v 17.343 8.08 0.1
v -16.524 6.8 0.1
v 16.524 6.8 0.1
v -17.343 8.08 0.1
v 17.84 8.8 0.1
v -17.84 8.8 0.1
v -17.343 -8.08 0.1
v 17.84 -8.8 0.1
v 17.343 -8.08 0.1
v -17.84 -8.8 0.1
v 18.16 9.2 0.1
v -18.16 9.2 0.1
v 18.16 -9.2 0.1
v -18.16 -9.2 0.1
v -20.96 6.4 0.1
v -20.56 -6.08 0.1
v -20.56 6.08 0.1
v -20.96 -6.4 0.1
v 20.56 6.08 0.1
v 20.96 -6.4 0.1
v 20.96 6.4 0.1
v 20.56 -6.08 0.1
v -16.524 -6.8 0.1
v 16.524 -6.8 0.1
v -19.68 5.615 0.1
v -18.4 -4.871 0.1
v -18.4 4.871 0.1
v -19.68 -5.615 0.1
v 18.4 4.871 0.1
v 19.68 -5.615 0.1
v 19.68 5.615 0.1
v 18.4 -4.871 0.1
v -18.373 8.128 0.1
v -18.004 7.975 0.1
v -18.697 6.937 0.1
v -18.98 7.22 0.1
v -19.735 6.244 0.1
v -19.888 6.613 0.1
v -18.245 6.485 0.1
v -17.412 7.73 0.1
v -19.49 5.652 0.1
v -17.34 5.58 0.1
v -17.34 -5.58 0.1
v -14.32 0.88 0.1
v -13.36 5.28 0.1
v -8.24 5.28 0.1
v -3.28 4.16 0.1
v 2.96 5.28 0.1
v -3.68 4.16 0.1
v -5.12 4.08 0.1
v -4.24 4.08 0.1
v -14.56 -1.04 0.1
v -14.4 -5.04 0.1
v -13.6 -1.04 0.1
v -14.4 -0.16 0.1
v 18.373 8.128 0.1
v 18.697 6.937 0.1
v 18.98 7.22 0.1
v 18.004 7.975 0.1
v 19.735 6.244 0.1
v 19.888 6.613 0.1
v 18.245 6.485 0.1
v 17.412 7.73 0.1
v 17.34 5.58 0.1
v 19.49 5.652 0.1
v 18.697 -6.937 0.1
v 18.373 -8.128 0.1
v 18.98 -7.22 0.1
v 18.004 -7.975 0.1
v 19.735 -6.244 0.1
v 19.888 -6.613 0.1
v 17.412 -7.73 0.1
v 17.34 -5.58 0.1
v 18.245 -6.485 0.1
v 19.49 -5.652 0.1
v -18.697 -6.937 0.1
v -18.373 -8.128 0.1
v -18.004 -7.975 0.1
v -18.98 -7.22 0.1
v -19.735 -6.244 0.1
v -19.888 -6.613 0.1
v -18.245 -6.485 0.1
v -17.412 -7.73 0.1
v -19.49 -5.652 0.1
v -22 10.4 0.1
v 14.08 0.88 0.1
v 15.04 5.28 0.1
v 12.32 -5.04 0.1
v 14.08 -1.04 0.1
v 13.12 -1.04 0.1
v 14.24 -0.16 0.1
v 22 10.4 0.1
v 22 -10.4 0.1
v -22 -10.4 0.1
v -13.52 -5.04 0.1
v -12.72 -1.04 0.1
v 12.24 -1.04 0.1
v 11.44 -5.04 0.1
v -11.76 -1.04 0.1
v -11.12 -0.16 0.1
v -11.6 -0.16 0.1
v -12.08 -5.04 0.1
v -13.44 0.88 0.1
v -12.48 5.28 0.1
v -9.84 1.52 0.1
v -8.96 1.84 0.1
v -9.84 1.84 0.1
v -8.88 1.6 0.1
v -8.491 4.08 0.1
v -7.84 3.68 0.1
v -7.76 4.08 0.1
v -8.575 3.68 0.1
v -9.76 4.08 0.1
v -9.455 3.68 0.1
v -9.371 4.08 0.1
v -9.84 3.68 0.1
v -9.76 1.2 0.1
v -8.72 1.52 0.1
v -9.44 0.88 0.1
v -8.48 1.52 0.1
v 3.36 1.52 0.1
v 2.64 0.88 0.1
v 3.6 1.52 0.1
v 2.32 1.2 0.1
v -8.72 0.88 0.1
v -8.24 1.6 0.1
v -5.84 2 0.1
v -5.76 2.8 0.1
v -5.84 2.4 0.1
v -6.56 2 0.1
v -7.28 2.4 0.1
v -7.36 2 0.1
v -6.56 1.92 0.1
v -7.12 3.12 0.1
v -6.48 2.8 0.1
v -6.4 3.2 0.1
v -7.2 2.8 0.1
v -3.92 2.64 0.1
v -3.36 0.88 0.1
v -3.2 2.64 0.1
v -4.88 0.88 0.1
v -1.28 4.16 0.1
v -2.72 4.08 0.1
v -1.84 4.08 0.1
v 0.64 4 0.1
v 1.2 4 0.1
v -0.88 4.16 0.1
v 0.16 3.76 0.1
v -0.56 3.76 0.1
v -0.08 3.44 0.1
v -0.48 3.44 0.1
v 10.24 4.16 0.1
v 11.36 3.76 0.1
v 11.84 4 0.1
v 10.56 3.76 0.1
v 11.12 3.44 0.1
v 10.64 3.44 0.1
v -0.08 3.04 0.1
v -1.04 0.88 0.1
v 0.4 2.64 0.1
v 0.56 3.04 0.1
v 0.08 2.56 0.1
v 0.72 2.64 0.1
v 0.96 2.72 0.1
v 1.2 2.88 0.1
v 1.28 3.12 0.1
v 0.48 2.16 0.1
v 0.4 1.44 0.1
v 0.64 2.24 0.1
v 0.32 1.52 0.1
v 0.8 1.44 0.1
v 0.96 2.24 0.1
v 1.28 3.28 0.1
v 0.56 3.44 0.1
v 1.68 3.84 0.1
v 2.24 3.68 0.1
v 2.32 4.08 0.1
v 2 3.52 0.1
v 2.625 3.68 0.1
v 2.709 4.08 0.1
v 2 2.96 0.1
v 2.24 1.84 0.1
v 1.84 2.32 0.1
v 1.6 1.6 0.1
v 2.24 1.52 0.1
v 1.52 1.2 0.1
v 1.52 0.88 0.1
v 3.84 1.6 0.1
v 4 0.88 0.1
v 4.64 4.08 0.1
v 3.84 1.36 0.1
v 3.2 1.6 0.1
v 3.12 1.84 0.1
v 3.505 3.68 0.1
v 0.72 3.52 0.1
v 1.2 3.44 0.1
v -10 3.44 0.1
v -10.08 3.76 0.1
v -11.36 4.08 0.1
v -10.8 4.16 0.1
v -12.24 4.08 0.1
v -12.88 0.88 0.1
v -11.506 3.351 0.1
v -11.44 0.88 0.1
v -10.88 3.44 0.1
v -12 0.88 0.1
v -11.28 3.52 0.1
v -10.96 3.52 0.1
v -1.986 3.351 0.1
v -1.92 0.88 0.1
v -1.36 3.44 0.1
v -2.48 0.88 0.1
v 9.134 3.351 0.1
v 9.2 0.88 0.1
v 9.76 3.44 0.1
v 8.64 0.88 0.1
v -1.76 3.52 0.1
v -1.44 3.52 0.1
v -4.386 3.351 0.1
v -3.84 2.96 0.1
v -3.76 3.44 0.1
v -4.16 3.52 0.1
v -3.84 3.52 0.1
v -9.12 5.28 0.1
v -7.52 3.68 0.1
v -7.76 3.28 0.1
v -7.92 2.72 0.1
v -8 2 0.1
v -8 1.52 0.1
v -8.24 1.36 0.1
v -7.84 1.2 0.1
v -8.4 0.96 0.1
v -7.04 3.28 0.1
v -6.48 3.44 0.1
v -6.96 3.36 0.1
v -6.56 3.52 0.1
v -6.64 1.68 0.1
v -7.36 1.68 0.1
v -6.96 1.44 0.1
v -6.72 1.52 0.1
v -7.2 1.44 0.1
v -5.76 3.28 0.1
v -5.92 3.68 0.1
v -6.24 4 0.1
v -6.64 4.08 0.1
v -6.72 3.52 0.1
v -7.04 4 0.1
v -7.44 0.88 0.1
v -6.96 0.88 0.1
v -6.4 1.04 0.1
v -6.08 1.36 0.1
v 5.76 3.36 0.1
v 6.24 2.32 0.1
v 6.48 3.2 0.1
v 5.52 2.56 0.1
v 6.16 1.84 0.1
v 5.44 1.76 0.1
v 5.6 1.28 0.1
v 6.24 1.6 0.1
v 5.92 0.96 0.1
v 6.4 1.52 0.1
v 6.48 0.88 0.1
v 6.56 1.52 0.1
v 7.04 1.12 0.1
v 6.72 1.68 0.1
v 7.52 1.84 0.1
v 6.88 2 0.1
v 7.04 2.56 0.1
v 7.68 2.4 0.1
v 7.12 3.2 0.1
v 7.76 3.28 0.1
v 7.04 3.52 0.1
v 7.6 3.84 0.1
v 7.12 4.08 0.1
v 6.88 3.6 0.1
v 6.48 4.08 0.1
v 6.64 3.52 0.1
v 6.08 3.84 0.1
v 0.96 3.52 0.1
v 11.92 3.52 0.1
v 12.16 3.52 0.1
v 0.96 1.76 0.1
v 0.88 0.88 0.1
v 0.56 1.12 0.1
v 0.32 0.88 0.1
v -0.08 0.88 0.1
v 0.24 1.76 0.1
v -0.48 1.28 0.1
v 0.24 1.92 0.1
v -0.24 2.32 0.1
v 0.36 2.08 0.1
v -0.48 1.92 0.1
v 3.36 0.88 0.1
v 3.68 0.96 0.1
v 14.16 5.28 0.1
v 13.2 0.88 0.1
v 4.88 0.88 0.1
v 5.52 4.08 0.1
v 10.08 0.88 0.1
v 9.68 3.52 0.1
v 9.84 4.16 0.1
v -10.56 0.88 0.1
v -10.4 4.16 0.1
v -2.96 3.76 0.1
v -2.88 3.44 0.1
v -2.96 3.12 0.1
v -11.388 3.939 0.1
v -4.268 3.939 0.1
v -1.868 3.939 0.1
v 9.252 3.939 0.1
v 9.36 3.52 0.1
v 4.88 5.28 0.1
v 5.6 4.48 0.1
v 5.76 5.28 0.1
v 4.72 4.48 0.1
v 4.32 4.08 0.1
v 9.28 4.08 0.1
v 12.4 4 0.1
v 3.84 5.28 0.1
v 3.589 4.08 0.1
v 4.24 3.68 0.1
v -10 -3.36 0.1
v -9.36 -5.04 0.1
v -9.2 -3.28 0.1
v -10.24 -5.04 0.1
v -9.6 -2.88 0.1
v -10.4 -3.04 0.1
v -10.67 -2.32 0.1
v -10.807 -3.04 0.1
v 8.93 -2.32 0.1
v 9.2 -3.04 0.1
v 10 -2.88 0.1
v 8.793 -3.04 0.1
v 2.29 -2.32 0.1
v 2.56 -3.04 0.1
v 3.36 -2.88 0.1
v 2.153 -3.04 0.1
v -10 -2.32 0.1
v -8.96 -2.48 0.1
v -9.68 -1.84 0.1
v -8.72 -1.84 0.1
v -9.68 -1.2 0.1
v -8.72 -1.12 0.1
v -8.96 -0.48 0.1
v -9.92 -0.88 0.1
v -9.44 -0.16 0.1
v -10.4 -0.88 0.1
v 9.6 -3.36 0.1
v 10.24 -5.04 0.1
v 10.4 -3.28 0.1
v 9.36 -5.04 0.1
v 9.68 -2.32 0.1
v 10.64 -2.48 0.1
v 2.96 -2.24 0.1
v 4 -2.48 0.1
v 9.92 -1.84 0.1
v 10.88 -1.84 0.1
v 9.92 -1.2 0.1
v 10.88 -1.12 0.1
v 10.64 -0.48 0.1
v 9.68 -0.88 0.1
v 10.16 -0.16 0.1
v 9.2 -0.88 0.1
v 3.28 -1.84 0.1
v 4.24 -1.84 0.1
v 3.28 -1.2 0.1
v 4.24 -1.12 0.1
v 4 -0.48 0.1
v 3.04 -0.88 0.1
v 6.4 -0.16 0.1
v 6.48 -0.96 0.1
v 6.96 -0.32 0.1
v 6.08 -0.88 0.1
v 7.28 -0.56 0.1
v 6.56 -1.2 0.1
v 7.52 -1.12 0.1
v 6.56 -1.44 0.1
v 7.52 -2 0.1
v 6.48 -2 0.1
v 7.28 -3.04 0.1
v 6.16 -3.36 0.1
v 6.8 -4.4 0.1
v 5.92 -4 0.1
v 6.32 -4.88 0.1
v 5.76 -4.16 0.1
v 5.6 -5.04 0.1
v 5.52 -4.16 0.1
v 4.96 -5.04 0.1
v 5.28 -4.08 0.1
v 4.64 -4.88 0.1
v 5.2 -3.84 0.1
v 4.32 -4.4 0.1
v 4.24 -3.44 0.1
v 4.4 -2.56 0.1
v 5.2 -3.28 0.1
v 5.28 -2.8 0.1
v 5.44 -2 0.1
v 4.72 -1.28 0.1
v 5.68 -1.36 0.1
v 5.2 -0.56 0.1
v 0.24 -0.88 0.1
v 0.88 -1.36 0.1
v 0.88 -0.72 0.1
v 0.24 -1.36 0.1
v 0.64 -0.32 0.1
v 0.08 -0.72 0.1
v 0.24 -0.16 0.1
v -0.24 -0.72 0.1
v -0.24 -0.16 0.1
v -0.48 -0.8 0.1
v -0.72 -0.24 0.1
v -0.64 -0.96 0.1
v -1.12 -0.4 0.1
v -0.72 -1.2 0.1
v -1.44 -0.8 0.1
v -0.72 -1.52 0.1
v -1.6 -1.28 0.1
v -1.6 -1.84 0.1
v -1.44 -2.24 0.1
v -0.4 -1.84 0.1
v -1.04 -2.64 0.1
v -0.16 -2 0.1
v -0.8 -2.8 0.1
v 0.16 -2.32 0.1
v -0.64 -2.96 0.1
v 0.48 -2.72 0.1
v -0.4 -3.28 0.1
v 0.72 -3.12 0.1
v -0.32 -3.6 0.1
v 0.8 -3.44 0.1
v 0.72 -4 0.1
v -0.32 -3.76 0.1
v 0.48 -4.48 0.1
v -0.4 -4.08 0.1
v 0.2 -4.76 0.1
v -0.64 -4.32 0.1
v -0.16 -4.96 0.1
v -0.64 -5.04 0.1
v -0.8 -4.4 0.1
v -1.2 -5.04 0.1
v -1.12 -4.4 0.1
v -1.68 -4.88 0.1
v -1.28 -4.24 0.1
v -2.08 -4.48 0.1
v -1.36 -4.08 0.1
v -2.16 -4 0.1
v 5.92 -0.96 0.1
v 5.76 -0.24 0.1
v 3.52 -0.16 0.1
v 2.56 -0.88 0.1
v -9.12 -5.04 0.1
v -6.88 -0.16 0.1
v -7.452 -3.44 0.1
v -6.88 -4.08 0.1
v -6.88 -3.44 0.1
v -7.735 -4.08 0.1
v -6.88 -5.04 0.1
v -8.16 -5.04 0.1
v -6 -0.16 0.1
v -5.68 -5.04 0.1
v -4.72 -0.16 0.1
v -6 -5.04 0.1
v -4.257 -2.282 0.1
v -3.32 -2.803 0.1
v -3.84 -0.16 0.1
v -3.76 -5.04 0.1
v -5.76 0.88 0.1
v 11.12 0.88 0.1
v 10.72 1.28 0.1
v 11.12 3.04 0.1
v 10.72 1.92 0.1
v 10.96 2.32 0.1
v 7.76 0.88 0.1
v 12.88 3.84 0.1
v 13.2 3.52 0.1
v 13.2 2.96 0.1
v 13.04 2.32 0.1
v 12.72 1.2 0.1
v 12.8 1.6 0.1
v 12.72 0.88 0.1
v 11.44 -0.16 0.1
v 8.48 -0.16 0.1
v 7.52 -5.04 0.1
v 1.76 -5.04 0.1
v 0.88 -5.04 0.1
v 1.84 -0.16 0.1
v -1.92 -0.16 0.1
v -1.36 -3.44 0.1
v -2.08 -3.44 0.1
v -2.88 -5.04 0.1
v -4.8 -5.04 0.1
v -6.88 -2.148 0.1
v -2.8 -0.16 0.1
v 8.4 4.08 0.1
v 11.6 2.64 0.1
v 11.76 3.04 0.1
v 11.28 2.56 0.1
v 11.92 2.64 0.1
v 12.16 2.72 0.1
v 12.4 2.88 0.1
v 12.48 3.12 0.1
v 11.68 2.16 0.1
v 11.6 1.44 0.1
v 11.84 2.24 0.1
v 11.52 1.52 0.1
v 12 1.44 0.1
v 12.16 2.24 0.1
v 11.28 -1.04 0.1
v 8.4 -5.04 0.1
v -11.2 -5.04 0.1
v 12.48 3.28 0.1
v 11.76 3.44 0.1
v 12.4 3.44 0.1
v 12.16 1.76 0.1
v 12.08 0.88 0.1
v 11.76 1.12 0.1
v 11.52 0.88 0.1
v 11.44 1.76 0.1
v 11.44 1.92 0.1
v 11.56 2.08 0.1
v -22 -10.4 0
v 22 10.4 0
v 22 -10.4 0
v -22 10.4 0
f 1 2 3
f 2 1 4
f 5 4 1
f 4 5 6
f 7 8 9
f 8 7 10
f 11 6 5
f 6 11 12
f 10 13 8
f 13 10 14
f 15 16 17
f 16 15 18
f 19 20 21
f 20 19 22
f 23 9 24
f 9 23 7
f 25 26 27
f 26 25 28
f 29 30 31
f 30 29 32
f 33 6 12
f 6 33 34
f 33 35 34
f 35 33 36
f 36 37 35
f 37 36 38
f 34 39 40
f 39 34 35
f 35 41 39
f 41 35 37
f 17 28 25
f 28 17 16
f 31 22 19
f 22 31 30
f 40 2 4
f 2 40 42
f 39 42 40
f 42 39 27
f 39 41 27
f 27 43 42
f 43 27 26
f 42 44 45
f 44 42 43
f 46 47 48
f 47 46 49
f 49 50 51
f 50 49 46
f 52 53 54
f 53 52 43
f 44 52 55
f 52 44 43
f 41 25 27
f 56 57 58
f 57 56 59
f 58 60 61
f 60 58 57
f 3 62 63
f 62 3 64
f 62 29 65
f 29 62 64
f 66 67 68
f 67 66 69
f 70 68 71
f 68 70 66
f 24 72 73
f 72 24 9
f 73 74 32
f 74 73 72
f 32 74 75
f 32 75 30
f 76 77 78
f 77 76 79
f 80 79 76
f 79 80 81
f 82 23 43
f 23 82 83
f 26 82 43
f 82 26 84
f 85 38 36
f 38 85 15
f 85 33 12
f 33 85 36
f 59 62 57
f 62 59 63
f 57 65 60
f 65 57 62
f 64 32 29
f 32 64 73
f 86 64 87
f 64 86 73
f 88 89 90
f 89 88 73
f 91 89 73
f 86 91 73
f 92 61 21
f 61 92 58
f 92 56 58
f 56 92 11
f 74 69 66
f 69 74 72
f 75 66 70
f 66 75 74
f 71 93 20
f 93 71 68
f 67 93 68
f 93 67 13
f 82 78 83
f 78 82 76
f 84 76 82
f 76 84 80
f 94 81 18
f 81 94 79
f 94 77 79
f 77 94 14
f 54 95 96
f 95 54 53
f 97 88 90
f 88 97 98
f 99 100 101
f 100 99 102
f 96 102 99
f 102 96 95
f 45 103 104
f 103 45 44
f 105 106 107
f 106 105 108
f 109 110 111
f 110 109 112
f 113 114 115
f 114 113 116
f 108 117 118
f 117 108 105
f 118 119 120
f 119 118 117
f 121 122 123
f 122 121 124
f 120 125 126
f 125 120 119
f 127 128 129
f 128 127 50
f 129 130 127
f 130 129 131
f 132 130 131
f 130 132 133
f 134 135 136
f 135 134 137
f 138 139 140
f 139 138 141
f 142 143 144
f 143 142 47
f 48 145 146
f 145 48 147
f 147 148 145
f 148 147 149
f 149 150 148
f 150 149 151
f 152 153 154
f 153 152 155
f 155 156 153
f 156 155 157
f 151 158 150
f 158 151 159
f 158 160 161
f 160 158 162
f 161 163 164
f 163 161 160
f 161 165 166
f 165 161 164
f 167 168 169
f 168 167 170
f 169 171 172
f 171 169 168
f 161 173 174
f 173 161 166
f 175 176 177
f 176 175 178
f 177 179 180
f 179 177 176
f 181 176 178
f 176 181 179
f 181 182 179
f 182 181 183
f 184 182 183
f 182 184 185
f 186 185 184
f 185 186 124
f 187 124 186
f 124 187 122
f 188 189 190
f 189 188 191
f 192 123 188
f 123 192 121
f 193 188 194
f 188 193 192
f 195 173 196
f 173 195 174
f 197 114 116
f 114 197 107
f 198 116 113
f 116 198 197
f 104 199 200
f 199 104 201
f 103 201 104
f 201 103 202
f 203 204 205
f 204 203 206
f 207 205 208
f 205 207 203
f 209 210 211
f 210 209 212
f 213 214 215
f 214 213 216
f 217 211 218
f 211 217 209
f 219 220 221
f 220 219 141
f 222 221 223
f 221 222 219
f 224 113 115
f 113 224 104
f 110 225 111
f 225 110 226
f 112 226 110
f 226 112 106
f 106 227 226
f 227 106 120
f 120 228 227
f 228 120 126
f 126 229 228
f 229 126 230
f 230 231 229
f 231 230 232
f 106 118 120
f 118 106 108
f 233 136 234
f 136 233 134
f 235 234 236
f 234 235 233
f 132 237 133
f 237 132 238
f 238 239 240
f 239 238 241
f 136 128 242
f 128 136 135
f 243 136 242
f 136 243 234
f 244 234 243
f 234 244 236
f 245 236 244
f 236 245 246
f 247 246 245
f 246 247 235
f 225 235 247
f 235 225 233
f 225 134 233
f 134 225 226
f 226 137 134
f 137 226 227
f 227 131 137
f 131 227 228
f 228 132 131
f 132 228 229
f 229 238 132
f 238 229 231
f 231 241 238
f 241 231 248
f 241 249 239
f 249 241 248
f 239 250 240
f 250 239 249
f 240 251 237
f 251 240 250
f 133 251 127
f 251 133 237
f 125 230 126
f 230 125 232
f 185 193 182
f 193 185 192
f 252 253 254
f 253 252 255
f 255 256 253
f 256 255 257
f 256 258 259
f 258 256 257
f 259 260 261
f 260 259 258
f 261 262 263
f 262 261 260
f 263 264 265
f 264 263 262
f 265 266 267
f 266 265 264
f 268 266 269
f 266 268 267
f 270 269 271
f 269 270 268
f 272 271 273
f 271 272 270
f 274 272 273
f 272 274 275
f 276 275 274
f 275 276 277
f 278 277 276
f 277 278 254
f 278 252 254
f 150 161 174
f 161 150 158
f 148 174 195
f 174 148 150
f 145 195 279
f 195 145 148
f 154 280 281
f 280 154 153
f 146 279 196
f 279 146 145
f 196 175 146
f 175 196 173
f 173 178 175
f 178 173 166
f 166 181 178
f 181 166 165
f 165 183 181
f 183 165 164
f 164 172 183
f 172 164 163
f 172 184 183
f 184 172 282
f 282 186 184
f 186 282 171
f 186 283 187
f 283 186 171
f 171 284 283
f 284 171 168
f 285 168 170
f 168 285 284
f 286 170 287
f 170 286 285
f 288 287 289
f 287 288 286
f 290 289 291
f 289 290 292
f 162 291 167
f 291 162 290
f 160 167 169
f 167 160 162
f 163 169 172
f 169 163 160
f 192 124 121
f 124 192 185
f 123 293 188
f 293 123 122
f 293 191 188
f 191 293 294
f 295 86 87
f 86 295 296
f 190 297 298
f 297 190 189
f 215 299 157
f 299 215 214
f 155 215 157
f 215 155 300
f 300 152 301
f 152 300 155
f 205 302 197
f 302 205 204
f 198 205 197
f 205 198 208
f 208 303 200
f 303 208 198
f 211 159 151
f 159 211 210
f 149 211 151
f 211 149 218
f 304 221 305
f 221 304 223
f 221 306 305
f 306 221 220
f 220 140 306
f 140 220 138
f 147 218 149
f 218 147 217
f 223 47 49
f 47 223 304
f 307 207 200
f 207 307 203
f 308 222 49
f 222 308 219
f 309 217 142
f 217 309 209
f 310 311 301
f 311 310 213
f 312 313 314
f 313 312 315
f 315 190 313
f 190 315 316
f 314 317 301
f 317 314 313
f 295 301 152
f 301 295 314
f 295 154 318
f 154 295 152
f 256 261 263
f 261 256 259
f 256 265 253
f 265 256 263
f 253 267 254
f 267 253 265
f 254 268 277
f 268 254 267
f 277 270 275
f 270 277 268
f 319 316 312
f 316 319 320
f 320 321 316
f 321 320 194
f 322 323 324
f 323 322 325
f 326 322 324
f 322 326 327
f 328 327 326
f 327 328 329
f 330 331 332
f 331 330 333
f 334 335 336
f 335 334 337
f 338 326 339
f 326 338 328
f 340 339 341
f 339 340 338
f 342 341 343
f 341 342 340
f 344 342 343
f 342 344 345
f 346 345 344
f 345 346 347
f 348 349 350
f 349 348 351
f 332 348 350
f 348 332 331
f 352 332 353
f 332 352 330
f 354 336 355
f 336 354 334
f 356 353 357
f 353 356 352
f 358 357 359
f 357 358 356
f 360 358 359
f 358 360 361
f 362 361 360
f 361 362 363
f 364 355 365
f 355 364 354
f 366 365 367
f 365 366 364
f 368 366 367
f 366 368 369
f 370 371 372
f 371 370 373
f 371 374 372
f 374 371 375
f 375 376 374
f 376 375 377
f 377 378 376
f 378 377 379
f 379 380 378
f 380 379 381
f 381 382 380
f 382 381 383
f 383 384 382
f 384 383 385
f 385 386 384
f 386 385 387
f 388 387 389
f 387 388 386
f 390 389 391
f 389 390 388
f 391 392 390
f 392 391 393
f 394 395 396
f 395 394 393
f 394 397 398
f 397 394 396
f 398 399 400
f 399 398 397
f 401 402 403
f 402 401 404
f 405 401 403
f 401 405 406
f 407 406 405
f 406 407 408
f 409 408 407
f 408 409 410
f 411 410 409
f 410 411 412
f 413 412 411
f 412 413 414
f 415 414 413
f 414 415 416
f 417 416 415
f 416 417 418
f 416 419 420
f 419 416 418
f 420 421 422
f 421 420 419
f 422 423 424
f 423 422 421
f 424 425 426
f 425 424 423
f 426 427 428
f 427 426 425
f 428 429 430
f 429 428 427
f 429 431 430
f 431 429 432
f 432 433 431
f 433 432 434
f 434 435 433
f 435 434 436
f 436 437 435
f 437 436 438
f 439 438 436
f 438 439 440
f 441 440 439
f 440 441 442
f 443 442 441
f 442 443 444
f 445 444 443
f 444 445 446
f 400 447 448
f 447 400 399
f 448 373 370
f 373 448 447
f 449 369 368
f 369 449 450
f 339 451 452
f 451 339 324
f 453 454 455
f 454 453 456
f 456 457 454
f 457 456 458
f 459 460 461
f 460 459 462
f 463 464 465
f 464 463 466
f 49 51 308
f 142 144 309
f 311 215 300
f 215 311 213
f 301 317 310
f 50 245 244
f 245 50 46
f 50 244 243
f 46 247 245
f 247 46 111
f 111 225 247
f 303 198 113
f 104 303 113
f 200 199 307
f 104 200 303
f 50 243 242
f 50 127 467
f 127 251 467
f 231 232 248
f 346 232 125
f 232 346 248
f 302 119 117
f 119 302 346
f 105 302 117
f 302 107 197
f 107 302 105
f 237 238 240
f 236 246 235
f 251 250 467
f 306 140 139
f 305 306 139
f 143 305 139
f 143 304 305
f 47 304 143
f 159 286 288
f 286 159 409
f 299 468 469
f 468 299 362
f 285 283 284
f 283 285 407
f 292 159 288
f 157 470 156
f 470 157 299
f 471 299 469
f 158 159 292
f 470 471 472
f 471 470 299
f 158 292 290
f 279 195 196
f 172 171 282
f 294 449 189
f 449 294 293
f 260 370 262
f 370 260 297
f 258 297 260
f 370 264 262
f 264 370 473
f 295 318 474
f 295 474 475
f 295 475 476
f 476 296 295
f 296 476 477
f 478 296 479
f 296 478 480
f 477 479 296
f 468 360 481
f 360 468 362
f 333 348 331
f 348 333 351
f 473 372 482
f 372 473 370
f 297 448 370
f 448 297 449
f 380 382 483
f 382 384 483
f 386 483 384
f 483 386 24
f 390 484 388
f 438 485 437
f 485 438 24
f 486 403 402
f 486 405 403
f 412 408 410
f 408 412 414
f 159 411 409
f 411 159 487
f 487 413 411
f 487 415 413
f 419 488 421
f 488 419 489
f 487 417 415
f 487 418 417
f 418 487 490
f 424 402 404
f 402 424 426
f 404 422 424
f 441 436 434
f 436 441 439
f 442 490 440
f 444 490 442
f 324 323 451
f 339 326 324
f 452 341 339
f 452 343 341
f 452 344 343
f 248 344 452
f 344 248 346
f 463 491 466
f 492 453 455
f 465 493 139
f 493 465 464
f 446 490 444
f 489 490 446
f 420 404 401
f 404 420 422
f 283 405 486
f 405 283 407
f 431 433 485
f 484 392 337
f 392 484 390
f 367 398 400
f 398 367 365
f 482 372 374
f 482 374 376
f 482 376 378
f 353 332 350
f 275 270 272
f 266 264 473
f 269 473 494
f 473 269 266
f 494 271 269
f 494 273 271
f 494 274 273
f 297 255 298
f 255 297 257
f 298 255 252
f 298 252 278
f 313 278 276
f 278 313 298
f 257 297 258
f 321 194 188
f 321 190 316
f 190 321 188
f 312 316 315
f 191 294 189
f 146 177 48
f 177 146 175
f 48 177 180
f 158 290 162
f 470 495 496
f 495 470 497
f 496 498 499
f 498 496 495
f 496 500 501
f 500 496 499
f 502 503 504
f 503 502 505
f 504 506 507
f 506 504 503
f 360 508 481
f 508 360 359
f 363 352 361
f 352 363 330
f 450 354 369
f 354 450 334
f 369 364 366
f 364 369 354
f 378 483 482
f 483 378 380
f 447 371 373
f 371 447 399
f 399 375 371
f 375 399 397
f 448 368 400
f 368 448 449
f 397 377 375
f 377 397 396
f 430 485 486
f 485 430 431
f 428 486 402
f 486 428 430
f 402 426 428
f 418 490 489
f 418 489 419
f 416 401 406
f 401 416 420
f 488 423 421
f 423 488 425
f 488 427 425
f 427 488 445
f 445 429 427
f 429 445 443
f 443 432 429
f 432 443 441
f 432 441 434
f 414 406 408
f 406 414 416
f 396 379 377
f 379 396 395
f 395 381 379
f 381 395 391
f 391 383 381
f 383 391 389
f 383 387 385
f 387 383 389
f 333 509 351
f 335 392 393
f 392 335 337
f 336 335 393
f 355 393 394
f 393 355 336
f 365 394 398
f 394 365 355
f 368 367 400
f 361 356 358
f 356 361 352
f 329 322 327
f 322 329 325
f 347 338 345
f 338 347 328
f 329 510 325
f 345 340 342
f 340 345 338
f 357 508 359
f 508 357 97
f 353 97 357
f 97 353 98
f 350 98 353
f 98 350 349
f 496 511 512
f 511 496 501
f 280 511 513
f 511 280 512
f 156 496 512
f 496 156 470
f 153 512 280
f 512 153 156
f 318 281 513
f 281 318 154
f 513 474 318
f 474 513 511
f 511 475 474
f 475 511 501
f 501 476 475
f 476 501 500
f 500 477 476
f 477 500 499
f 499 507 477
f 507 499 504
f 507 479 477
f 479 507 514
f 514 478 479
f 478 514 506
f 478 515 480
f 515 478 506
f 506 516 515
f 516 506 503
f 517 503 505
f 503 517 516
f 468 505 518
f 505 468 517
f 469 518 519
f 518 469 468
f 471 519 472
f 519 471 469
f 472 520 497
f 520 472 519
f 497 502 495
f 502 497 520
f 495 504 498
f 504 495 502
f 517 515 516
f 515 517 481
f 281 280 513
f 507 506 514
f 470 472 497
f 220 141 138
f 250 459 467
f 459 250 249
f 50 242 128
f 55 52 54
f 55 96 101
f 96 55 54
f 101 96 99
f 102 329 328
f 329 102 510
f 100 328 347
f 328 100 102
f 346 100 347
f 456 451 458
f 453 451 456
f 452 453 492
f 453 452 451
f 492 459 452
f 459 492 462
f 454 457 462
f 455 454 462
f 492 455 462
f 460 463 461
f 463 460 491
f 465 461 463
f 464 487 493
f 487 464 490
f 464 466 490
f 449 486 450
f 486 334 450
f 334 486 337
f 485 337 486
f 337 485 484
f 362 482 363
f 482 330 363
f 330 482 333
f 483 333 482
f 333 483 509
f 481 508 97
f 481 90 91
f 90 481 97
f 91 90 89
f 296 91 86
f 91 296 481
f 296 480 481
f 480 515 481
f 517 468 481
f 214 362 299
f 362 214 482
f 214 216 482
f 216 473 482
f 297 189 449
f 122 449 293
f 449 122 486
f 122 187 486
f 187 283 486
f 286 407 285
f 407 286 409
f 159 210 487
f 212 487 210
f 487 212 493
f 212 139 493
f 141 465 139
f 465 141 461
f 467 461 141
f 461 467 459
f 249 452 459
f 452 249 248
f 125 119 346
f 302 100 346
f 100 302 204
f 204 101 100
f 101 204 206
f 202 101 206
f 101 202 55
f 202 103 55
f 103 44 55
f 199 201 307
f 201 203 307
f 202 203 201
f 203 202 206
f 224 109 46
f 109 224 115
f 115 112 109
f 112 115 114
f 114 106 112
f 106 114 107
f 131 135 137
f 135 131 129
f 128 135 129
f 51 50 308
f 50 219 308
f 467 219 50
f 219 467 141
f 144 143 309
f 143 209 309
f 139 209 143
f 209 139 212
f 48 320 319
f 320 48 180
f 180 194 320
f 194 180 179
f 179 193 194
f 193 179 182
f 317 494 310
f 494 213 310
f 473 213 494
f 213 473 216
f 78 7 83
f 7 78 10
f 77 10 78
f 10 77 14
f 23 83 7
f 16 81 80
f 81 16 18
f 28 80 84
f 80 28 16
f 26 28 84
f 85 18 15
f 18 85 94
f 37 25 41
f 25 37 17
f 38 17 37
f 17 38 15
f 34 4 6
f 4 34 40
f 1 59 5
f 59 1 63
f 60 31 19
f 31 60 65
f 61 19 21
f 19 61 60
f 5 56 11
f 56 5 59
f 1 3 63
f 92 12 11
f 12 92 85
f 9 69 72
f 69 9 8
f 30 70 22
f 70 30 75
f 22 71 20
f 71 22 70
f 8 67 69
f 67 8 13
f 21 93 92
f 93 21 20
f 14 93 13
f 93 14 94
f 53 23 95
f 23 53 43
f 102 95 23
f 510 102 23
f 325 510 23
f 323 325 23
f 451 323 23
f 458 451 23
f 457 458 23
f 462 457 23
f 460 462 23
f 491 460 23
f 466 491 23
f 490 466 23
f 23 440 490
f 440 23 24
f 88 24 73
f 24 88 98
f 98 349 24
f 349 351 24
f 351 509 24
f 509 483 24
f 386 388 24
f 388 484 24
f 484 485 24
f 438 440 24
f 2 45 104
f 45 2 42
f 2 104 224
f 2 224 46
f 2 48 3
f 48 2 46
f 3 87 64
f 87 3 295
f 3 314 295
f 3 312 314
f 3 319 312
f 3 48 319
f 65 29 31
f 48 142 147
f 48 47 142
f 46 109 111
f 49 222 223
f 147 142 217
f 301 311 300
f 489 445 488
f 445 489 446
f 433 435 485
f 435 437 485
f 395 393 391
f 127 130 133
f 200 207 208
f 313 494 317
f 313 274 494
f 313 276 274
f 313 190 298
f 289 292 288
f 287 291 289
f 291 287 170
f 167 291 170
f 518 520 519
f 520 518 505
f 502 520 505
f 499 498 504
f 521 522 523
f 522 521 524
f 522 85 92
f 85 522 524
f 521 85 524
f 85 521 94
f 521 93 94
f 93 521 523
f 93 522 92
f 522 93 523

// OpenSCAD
use <../lib.scad>
use <003440a.scad>
function ldraw_lib__004747b() = [
// 0 =Sticker  2.6 x  5.5 with Black "International TRANSPORT" on Yellow
// 0 Name: 004747b.dat
// 0 Author: Alex Taylor [anathema]
// 0 !LDRAW_ORG Part Alias UPDATE 2020-01
// 0 !LICENSE Licensed under CC BY 4.0 : see CAreadme.txt
// 
// 0 BFC CERTIFY CCW
  [0,"BFC","CERTIFY"],
  [0,"BFC","CCW"],
// 
// 0 !KEYWORDS set 183, Train
// 
// 0 !HISTORY 2020-06-28 [PTadmin] Official Update 2020-01
// 
// 
// 1 16 0 0 0 1 0 0 0 1 0 0 0 1 003440a.dat
  [1,16,0,0,0,1,0,0,0,1,0,0,0,1, ldraw_lib__003440a()],
];
module ldraw_lib__004747b(step=0, col=false, unit=2/5, alt=false, line=0.2, solid=!$preview)
    makepoly(ldraw_lib__004747b(), step=step, col=col, unit=unit, alt=alt, line=line, solid=solid);
ldraw_lib__004747b(line=0.2);
